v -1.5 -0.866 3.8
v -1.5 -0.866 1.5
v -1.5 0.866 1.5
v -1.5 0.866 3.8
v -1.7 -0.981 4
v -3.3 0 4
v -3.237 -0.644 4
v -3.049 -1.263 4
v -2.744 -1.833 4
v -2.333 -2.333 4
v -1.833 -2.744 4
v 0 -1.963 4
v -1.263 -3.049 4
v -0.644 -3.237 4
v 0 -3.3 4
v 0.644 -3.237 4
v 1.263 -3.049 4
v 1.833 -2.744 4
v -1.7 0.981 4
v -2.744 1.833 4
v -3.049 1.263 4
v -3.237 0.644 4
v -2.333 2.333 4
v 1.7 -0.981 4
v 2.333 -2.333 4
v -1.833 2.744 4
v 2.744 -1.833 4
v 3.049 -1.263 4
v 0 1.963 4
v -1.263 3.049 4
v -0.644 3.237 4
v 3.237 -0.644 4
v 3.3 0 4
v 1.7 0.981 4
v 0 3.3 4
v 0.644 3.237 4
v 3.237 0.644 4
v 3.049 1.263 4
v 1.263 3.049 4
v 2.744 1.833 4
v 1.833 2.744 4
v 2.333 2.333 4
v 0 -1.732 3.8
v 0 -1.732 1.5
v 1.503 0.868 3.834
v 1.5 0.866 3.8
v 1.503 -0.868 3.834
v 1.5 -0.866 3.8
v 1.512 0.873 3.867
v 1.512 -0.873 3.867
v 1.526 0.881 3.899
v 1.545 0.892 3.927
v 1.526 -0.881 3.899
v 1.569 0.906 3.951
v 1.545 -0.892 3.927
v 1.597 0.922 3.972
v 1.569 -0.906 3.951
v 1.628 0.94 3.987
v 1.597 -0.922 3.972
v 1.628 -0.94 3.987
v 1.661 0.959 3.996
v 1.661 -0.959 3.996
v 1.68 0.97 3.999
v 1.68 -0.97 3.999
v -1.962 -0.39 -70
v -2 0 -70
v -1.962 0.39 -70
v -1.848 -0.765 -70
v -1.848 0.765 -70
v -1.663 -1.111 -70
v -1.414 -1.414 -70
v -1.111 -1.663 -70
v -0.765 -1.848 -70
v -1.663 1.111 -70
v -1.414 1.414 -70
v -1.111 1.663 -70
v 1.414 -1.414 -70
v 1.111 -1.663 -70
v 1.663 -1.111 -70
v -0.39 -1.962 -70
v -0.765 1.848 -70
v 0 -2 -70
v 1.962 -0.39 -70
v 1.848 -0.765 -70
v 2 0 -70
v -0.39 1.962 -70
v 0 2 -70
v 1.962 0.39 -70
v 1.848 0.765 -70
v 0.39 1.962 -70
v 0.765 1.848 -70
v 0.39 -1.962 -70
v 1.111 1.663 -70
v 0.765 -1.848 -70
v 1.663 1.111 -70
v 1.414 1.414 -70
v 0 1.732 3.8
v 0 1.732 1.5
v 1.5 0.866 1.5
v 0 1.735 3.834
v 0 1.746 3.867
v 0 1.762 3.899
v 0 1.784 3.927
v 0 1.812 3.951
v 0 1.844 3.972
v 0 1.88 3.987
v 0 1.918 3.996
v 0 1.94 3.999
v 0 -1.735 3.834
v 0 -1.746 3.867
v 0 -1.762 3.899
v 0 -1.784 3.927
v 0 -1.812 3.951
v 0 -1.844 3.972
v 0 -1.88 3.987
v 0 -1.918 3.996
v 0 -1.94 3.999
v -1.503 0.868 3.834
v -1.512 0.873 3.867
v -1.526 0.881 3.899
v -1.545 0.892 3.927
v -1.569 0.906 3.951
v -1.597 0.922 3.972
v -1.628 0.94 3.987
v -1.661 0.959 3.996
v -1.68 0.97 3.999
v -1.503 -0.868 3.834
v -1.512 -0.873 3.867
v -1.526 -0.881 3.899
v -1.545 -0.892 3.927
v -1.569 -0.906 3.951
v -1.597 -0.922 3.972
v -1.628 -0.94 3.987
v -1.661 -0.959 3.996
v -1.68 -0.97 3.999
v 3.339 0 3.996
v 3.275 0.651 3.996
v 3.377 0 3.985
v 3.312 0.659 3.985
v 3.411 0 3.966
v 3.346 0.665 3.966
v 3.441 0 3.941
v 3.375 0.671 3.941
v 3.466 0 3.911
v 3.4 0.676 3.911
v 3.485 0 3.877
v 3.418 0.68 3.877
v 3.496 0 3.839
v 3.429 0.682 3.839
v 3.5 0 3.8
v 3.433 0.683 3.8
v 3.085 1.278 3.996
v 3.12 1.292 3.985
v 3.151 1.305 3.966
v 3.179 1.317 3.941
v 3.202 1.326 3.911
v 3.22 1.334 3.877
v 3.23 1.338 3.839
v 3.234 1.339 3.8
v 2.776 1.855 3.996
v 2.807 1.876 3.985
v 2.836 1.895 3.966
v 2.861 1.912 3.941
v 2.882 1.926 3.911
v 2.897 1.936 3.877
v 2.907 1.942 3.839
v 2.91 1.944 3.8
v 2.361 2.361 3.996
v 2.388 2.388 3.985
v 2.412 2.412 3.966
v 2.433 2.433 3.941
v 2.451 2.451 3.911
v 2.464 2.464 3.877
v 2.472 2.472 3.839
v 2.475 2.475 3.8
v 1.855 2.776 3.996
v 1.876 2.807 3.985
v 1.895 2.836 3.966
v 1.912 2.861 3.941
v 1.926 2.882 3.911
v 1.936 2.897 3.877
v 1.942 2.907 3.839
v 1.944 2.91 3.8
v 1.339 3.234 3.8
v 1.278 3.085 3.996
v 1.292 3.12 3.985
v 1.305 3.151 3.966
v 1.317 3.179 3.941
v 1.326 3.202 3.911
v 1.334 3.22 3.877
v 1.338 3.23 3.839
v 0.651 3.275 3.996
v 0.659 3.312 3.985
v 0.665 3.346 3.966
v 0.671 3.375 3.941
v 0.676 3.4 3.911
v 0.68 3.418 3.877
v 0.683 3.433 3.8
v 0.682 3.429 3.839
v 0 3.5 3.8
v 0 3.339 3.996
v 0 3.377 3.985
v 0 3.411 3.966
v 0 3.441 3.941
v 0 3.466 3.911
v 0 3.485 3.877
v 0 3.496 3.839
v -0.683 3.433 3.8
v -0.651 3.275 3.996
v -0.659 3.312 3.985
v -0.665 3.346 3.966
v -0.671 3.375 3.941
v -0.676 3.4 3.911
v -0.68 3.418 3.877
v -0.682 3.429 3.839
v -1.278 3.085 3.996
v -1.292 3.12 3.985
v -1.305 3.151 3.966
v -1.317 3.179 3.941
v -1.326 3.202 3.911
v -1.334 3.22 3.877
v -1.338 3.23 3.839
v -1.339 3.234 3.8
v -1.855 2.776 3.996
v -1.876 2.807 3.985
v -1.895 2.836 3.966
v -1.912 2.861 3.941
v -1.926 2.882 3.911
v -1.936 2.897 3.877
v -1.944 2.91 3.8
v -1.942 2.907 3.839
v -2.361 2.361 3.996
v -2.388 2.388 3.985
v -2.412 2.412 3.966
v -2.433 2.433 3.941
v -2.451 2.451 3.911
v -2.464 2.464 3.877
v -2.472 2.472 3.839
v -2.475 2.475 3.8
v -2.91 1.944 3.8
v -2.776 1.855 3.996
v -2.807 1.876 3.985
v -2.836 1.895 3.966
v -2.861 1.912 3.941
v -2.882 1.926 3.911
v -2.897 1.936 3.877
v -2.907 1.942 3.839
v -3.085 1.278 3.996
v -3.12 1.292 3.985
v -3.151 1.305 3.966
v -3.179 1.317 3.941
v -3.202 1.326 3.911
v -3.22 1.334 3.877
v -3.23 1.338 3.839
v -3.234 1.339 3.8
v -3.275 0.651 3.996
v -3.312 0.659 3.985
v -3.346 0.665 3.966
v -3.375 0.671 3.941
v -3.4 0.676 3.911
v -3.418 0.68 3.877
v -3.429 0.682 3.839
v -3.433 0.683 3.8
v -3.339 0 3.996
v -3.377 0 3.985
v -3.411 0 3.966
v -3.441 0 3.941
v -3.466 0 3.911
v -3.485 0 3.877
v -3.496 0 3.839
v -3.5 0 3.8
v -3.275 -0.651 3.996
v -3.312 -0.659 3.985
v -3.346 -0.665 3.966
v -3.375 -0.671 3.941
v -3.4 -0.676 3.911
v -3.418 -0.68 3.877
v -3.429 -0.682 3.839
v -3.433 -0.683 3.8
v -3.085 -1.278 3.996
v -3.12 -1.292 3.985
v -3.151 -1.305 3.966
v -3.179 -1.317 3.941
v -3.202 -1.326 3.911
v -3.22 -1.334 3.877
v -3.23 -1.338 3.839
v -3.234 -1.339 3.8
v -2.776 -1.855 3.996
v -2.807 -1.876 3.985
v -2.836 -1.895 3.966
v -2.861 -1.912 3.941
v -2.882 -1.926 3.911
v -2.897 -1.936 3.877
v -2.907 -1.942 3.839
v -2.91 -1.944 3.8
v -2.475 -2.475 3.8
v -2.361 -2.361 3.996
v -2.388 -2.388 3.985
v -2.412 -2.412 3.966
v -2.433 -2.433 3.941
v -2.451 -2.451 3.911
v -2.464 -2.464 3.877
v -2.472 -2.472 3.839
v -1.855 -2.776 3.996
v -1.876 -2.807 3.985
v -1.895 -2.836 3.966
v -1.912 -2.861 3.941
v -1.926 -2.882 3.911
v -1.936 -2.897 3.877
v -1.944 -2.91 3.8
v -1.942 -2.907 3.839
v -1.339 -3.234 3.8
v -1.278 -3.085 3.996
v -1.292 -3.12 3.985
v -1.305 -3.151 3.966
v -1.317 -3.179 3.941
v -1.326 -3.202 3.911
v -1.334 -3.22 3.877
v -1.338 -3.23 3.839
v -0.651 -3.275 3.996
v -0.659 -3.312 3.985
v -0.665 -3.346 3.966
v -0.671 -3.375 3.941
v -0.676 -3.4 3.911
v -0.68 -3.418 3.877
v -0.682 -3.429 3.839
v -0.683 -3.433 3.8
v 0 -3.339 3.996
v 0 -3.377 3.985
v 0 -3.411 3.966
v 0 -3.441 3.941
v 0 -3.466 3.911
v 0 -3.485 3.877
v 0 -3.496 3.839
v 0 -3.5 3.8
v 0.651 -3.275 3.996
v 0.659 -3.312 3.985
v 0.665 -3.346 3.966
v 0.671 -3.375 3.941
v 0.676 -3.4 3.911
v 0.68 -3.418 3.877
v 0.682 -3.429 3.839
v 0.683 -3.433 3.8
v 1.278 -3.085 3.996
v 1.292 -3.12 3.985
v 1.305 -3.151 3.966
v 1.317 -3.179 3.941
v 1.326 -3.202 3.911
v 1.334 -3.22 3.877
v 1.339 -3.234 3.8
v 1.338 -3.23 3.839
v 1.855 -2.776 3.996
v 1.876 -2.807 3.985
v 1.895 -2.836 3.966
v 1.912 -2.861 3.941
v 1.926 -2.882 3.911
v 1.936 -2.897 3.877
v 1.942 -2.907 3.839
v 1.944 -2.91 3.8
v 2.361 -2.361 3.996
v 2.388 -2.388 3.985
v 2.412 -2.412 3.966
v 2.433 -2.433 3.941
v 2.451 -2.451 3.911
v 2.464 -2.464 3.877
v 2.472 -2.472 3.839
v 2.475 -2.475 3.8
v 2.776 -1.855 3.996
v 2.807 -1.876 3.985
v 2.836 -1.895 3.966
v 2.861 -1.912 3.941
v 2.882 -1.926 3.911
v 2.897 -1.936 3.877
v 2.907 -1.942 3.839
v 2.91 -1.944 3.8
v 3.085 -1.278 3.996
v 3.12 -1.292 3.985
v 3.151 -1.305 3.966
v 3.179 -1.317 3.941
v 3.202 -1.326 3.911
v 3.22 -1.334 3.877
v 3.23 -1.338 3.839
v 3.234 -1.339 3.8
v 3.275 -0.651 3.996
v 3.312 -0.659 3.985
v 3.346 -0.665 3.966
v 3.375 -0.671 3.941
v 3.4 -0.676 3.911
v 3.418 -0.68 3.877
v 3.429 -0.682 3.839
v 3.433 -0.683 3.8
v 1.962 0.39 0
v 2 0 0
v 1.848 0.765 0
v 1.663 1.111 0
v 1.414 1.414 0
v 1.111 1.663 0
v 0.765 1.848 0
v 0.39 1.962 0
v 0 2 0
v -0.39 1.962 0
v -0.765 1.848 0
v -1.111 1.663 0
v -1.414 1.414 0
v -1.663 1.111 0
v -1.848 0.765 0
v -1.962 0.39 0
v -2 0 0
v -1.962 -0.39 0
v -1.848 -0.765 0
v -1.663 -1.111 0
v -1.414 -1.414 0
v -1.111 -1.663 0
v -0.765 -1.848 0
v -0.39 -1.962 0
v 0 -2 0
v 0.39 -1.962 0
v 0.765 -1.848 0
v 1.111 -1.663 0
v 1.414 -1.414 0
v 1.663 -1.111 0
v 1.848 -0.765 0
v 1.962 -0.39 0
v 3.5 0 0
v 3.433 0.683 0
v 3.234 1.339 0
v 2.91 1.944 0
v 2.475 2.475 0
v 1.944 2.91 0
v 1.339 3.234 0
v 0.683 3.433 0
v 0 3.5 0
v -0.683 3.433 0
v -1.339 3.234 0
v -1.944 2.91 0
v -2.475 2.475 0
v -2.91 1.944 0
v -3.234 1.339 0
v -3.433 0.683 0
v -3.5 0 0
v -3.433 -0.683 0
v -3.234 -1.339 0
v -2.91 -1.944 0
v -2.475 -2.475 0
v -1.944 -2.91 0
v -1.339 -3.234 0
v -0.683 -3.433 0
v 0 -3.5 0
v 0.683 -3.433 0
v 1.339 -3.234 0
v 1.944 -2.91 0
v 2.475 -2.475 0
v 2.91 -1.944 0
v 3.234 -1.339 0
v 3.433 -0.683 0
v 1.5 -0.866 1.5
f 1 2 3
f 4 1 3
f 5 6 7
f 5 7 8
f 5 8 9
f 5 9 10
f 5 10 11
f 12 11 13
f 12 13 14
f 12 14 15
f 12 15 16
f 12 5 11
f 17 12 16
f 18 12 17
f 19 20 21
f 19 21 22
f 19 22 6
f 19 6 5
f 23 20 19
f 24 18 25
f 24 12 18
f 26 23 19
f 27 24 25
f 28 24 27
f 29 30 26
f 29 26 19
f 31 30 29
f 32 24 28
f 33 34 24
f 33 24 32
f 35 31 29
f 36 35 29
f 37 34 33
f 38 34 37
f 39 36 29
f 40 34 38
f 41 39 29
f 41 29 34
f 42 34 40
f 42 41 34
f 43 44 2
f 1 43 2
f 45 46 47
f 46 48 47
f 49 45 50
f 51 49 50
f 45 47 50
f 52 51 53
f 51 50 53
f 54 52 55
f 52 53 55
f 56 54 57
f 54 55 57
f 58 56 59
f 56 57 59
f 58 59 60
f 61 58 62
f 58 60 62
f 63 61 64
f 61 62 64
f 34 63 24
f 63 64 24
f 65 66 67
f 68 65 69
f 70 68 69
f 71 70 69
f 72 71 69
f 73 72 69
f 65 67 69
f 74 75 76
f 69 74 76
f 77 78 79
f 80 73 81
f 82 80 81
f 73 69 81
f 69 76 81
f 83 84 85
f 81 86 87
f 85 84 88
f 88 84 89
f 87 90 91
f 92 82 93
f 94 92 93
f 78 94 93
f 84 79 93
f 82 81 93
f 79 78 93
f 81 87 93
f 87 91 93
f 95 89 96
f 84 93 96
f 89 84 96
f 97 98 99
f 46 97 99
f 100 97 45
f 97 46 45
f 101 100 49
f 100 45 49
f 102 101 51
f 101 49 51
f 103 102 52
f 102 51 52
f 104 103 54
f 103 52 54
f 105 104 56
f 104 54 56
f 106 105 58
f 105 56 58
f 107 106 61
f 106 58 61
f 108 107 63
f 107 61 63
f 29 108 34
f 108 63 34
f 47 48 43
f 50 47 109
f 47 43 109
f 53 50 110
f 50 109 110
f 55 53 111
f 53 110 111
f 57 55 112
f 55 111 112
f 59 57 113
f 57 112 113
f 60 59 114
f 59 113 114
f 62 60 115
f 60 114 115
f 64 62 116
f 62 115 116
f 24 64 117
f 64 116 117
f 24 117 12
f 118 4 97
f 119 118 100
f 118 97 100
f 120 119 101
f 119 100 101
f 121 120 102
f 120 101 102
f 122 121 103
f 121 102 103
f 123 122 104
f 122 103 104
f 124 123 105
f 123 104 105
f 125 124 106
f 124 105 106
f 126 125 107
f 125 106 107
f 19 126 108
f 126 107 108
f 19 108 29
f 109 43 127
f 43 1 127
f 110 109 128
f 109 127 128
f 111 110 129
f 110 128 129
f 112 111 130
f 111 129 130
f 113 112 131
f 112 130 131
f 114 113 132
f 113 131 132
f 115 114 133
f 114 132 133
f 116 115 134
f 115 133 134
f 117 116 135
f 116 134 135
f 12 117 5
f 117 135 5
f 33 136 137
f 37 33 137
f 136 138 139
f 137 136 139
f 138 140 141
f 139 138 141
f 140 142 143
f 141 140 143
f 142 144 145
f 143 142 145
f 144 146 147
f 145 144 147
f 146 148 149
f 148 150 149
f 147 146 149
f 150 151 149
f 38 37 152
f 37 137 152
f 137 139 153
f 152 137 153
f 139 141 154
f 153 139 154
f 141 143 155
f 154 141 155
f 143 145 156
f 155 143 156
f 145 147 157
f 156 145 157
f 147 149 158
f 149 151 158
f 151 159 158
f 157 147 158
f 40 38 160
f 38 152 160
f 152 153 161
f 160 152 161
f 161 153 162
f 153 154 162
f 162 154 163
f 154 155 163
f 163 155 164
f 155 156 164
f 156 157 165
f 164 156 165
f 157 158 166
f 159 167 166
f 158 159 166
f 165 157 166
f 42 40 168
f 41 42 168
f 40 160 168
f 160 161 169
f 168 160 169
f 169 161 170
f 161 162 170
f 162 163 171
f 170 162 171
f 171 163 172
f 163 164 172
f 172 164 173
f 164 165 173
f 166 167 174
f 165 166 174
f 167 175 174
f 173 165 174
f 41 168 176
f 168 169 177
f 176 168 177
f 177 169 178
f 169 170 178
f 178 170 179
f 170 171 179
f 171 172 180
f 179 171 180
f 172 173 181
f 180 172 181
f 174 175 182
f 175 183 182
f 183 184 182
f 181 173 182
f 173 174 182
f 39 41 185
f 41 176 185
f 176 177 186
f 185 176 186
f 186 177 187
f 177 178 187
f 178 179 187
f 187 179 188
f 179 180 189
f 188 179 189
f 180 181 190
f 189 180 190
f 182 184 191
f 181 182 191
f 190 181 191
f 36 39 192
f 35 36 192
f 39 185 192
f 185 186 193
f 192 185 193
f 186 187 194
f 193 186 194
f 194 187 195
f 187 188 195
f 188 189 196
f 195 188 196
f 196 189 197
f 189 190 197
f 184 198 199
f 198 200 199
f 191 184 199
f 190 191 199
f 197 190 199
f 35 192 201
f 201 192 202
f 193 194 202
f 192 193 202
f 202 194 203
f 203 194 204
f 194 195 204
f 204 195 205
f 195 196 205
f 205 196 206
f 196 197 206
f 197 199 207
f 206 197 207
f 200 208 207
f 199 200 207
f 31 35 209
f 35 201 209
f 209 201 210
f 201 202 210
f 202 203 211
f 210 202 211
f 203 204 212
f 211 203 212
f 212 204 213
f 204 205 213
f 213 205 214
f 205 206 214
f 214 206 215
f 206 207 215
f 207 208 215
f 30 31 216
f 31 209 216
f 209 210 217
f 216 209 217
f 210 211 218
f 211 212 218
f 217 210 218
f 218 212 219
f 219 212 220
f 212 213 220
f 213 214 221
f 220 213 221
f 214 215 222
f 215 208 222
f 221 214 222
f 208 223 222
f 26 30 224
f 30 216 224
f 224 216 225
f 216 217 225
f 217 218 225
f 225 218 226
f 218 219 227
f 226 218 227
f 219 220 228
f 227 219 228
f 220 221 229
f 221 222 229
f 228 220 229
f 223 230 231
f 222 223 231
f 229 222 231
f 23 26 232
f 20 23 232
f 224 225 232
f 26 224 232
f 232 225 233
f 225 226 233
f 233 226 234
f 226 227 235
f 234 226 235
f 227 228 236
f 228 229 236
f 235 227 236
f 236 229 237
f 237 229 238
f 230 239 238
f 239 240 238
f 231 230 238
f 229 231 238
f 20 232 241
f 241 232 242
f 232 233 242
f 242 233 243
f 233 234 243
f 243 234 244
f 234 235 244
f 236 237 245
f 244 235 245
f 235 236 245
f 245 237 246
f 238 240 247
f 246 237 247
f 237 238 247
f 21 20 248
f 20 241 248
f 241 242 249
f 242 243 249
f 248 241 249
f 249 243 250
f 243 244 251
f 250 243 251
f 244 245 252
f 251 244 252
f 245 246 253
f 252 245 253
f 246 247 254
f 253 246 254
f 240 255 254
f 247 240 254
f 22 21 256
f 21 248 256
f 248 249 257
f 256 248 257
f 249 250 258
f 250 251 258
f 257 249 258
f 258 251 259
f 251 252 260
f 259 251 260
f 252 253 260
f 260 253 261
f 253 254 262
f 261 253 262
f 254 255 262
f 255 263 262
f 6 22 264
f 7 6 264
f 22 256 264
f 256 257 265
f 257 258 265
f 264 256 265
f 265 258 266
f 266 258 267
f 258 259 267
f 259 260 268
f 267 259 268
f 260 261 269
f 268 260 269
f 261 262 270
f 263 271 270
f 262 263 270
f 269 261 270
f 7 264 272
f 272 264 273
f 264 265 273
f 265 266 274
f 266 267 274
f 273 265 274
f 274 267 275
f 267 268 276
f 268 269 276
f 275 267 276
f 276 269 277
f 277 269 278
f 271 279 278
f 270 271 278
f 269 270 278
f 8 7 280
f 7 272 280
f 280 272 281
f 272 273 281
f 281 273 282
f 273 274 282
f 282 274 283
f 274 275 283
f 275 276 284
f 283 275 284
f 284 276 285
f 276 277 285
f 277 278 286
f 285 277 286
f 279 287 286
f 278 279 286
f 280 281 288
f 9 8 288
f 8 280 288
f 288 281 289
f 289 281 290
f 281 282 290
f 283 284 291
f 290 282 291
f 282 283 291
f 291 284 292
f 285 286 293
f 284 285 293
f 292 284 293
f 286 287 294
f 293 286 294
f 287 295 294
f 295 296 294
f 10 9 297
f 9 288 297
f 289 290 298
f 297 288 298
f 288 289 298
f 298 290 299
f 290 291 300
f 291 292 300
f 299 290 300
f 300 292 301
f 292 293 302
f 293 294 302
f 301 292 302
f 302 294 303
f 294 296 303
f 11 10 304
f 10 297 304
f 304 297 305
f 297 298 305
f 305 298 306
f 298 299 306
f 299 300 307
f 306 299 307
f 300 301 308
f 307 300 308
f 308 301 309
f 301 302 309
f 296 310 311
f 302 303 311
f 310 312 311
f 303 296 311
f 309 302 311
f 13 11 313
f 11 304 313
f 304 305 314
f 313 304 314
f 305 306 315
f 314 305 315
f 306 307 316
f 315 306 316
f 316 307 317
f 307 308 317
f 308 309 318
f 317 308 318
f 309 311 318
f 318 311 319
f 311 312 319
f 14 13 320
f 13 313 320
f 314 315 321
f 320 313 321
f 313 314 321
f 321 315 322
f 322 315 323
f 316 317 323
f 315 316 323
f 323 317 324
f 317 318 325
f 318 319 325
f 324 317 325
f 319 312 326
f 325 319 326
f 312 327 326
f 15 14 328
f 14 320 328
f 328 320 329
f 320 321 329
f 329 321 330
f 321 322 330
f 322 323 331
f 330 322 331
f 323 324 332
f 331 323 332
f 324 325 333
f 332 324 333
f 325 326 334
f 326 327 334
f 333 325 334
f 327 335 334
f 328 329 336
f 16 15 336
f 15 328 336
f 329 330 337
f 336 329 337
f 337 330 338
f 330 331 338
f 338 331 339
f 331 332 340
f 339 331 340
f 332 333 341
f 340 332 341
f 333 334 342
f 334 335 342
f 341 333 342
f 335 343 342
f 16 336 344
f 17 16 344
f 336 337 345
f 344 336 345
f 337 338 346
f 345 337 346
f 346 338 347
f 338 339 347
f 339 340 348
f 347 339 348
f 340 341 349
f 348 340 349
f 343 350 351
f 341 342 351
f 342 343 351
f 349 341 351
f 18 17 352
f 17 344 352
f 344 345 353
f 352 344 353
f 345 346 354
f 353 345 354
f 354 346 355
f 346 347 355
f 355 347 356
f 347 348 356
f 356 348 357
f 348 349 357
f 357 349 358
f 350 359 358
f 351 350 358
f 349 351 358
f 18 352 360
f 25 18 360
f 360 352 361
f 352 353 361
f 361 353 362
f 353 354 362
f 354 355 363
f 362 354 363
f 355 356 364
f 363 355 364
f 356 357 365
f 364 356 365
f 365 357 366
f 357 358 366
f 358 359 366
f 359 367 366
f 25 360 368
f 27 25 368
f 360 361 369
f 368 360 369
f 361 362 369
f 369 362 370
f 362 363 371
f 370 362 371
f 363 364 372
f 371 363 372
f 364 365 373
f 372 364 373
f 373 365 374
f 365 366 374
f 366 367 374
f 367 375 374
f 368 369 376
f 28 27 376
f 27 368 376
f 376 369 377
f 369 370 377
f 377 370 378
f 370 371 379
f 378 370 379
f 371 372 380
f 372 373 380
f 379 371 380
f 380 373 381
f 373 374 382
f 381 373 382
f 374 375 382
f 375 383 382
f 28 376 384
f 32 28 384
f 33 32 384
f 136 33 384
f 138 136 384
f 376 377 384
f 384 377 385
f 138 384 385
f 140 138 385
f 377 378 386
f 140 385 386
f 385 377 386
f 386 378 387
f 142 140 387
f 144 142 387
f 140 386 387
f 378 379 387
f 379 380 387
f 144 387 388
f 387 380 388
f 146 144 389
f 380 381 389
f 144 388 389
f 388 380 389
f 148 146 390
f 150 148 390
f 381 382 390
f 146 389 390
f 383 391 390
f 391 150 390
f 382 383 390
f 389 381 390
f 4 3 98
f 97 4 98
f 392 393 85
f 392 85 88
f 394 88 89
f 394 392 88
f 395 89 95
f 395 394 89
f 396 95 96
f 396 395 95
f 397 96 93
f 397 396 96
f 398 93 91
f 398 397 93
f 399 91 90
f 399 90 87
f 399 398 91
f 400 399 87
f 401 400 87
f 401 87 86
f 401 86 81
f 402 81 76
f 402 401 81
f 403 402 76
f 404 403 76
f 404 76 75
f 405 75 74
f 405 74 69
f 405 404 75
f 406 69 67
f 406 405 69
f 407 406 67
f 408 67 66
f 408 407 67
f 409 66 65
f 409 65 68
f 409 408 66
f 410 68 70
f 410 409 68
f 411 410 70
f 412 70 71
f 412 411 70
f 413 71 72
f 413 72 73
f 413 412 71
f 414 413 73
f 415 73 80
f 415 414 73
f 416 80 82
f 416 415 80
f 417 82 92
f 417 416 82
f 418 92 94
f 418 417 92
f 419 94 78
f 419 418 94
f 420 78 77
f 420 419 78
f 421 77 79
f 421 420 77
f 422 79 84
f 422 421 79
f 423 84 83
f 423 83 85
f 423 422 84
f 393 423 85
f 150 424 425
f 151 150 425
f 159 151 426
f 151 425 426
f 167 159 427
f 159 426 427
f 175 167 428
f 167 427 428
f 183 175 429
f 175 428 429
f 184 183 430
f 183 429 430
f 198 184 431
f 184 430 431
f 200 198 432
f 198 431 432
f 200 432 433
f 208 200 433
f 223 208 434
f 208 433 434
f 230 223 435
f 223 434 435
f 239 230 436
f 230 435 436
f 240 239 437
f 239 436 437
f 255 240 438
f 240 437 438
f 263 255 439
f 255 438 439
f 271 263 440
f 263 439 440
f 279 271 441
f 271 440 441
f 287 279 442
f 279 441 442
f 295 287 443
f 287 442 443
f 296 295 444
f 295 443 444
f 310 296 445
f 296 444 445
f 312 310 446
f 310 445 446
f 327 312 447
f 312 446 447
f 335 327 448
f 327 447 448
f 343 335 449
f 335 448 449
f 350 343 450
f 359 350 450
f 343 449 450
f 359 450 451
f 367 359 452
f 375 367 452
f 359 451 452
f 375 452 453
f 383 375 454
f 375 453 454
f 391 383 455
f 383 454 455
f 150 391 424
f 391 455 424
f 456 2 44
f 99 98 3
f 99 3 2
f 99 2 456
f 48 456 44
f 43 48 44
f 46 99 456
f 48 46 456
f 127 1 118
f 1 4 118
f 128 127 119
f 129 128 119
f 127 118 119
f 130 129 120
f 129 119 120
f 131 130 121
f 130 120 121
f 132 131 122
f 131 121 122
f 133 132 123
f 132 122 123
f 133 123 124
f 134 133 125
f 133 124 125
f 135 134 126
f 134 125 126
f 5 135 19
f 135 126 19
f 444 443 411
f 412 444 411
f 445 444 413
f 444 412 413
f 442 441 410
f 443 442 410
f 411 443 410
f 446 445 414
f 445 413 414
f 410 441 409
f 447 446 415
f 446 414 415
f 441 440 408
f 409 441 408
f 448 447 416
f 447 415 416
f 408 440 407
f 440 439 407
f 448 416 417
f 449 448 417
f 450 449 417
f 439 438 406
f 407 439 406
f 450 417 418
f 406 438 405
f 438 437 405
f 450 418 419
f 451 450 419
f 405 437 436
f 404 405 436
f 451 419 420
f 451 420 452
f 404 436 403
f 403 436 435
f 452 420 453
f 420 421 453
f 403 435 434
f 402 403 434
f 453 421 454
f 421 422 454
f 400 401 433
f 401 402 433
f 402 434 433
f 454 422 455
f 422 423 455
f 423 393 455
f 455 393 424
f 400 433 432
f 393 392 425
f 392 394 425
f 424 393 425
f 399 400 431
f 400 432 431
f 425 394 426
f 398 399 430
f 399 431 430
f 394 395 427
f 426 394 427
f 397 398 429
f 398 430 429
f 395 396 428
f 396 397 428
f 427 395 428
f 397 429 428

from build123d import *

# Parameters (mm, degrees)
F0_R     = 3.5
F0_R_2   = 2
F1_DEPTH = 4
F2_DEPTH = 70
F3_DEPTH = 1.5
F4_R     = 0.2


with BuildPart() as f1:
    # F0 (on Top) → F1 (new body)
    with BuildSketch(Plane.XY):
        Circle(F0_R)
        Circle(F0_R_2, mode=Mode.SUBTRACT)
        Circle(F0_R_2)
        Polygon((0, 1.732051), (1.5, 0.866025), (1.5, -0.866025), (0, -1.732051), (-1.5, -0.866025), (-1.5, 0.866025), align=None, mode=Mode.SUBTRACT)
    extrude(amount=F1_DEPTH)

    # F0 (on Top) → F2 (join)
    with BuildSketch(Plane.XY):
        Circle(F0_R_2)
        Polygon((0, 1.732051), (1.5, 0.866025), (1.5, -0.866025), (0, -1.732051), (-1.5, -0.866025), (-1.5, 0.866025), align=None, mode=Mode.SUBTRACT)
        Polygon((1.5, -0.866025), (1.5, 0.866025), (0, 1.732051), (-1.5, 0.866025), (-1.5, -0.866025), (0, -1.732051), align=None)
    extrude(amount=-F2_DEPTH)

    # F0 (on Top) → F3 (join)
    with BuildSketch(Plane.XY):
        Polygon((1.5, -0.866025), (1.5, 0.866025), (0, 1.732051), (-1.5, 0.866025), (-1.5, -0.866025), (0, -1.732051), align=None)
    extrude(amount=F3_DEPTH)

    # F4
    f4_edges = [f1.edges().sort_by_distance(p)[0] for p in [
        (-3.5, 0, 4),
        (-0.75, -1.299038, 4),
        (-1.5, 0, 4),
        (-0.75, 1.299038, 4),
        (0.75, 1.299038, 4),
        (1.5, 0, 4),
        (0.75, -1.299038, 4),
    ]]
    fillet(f4_edges, radius=F4_R)


solid = f1.part
